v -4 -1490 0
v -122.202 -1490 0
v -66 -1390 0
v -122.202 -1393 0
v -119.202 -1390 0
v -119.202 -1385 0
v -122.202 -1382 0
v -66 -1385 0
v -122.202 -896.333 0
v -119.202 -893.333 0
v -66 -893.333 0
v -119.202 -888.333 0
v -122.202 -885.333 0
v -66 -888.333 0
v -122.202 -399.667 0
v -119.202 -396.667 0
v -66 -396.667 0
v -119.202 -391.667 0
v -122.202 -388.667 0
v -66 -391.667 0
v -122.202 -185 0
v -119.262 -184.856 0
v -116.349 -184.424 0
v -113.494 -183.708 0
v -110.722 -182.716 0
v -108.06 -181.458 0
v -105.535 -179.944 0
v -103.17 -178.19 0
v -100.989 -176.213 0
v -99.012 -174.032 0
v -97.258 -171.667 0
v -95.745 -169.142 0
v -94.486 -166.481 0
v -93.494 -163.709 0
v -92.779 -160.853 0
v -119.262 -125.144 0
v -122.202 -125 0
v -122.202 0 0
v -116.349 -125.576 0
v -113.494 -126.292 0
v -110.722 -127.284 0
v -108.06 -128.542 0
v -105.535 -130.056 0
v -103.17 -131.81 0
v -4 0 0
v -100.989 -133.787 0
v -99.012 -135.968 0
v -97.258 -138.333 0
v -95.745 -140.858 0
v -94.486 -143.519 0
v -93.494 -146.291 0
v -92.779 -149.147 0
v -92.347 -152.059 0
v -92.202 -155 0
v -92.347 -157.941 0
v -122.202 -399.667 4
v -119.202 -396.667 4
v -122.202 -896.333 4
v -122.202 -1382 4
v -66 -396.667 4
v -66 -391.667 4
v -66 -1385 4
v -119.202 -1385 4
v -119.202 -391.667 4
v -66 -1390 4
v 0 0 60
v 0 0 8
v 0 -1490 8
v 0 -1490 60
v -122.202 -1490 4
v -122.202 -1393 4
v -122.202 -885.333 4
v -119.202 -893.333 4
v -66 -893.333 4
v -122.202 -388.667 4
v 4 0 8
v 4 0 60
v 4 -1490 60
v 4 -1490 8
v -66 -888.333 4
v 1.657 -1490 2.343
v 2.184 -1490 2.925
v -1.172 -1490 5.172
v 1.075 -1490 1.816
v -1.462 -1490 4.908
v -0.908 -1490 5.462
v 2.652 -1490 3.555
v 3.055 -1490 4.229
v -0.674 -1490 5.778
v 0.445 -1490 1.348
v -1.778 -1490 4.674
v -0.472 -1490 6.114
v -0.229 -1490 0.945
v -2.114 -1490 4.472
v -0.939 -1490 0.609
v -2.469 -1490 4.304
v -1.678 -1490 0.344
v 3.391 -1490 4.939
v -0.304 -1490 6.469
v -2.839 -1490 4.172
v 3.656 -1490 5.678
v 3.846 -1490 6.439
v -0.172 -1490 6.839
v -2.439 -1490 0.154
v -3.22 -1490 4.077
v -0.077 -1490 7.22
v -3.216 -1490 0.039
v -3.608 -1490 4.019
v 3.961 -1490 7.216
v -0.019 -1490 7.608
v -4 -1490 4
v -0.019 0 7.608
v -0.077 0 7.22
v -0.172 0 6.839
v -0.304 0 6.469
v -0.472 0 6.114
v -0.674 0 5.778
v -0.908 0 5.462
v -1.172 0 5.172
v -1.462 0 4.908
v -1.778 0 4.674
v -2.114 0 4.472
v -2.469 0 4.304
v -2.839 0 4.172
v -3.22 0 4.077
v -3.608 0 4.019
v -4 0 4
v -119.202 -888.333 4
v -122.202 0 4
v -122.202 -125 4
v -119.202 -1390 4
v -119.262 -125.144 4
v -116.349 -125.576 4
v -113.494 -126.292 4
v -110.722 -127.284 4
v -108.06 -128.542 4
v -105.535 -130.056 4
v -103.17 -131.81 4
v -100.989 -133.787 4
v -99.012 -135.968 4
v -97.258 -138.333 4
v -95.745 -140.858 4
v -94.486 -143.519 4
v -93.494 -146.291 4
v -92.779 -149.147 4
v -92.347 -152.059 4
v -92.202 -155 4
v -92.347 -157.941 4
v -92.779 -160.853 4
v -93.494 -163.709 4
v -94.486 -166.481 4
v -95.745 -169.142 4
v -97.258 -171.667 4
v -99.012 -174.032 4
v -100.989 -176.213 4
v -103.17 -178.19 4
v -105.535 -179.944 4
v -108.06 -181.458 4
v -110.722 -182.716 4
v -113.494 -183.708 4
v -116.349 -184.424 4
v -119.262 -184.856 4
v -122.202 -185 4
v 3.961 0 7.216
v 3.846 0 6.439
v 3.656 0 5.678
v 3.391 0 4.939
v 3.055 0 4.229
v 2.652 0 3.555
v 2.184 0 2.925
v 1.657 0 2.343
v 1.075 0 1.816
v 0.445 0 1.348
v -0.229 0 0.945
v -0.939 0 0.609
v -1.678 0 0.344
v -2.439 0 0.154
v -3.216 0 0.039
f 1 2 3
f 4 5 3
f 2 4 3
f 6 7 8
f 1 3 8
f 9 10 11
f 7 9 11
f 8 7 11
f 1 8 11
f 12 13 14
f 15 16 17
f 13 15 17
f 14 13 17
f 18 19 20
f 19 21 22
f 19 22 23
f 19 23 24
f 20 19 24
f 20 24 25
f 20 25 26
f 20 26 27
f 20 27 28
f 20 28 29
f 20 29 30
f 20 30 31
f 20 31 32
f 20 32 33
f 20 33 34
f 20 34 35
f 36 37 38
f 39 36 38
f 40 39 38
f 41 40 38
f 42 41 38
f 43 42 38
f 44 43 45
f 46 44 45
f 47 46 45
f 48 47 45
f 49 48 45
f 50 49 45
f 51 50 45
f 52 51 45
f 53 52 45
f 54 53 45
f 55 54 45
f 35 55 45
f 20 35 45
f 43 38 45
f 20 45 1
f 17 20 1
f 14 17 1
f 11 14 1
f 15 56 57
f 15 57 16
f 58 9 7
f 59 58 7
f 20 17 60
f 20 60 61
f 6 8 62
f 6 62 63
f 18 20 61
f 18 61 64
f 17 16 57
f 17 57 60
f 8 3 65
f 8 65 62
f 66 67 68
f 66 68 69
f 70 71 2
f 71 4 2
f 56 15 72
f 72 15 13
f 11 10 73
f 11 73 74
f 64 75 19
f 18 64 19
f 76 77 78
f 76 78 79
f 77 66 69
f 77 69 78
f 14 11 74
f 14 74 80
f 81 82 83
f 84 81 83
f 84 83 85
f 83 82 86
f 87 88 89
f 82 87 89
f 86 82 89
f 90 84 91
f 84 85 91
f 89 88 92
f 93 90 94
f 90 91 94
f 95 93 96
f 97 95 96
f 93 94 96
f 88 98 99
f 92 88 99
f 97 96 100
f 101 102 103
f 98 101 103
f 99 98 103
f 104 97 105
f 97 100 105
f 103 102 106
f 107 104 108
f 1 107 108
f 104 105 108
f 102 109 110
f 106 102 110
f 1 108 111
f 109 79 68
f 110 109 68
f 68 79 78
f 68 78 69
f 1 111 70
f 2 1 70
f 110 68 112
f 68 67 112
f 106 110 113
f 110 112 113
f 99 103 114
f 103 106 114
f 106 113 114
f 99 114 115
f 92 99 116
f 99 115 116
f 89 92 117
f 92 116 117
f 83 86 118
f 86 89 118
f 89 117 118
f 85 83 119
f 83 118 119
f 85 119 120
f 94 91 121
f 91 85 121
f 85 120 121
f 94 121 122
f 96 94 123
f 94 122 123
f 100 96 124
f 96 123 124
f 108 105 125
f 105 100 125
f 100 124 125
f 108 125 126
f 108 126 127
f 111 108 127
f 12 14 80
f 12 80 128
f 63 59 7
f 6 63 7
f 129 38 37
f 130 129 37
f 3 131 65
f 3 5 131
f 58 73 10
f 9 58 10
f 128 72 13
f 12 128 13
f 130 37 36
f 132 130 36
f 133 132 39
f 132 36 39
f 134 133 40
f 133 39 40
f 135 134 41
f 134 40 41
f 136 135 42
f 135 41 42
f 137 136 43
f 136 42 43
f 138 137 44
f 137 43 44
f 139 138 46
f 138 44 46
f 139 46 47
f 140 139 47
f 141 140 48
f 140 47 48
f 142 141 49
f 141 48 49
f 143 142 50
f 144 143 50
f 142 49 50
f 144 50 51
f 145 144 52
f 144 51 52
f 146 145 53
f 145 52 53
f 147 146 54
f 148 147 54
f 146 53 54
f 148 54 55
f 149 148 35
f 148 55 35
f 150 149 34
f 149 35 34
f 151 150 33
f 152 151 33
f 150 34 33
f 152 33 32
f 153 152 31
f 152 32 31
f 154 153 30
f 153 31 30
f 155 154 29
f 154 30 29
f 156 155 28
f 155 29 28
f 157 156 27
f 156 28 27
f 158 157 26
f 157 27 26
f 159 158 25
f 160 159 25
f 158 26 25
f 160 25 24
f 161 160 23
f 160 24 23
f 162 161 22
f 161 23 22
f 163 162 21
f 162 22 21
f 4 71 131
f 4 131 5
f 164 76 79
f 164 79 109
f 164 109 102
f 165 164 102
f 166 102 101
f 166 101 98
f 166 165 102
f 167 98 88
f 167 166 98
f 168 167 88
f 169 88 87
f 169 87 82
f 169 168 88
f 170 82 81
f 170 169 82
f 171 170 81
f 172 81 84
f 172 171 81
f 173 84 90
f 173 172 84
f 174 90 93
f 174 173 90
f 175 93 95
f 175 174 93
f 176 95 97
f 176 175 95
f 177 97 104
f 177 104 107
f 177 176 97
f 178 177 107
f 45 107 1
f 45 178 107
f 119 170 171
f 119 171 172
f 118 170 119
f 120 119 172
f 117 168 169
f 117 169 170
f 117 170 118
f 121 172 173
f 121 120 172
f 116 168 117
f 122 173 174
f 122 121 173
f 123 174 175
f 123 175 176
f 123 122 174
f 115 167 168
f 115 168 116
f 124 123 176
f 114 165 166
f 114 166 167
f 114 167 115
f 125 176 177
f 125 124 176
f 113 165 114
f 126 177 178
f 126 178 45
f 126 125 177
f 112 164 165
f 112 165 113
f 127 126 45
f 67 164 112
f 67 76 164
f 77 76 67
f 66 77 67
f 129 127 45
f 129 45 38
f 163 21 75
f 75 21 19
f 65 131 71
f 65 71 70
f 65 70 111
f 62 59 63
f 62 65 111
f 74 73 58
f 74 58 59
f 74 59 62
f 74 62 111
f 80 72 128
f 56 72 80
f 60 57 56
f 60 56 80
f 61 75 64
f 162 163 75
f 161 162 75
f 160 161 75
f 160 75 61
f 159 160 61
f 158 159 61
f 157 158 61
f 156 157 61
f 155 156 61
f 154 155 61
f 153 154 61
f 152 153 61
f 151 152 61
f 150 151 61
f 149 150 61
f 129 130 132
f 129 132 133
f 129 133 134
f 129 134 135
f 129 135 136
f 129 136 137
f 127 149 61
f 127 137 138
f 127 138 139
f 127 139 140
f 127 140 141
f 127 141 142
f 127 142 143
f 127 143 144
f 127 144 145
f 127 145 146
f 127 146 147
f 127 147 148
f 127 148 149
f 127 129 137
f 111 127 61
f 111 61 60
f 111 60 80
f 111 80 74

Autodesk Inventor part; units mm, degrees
ref_plane "YZ Plane" through (0, 0, 0) normal (1, 0, 0) x (0, 1, 0)
ref_plane "XZ Plane" through (0, 0, 0) normal (0, 1, 0) x (-1, 0, 0)
ref_plane "XY Plane" through (0, 0, 0) normal (0, 0, 1) x (1, 0, 0)
sketch "Sketch1" plane through (0, 0, 0) normal (0, 0, 1) x (1, 0, 0)
  line L0 (0, 0) -> (-122.2022, 0)
  line L1 (-122.2022, 0) -> (-122.2022, -1490)
  line L2 (-122.2022, -1490) -> (0, -1490)
  line L3 (0, -1490) -> (0, 0)
  line L4 (-122.2022, -1390) -> (-66, -1390)
  line L5 (-66, -1390) -> (-66, -1385)
  line L6 (-66, -1385) -> (-122.2022, -1385)
  line L7 (-122.2022, -1385) -> (-122.2022, -1390)
  line L8 (-122.2022, -893.3333) -> (-66, -893.3333)
  line L9 (-66, -893.3333) -> (-66, -888.3333)
  line L10 (-66, -888.3333) -> (-122.2022, -888.3333)
  line L11 (-122.2022, -888.3333) -> (-122.2022, -893.3333)
  line L12 (-122.2022, -396.6667) -> (-66, -396.6667)
  line L13 (-66, -396.6667) -> (-66, -391.6667)
  line L14 (-66, -391.6667) -> (-122.2022, -391.6667)
  line L15 (-122.2022, -391.6667) -> (-122.2022, -396.6667)
  circle A0 centre (-122.2022, -155) radius 30
  point P0 (-122.2022, -1385)
  point P1 (-122.2022, -125)
  point P2 (-122.2022, -185)
  dimension "d0" = 1490
  dimension "d1" = 122.2022
  dimension "d2" = 5
  dimension "d4" = 100
  dimension "d7" = 496.6667
  dimension "d23" = 66
  dimension "d28" = 60
  dimension "d29" = 1335
extrude "Plate1" add sketch "Sketch1" along normal blind 4 contours L3 L2 L1 L4 L5 L6 L8 L9 L10 L12 L13 L14 A0 L0
sketch "Sketch2" plane through (4, 0, 0) normal (-1, 0, 0) x (0, -1, 0)
  line L0 (1490, 0) -> (0, 0)
  line L1 (0, 0) -> (0, 60)
  line L2 (0, 60) -> (1490, 60)
  line L3 (1490, 60) -> (1490, 0)
edge flange "Flange1" height 60 angle 90 thickness 4 bend radius 4 thickness toward (-1, 0, 0) relief tear relief width 4 relief depth 2 edges at (0, -745, 4) wall of the first edge with corners at (4, -1490, 0) (4, 0, 0) (4, 0, 60) (4, -1490, 60)
bend "Bend1"
corner "Corner1"
chamfer "Corner Chamfer1" distance 3 angle 45 6 edges at (-122.2022, -1390, 2) (-122.2022, -1385, 2) (-122.2022, -893.3333, 2) (-122.2022, -888.3333, 2) (-122.2022, -391.6667, 2) (-122.2022, -396.6667, 2)
equation "\"d0\" = Стрингер_длина"
equation "\"d1\" = стрингер_глубина_7"
equation "\"d2\" = паз_под_стрингер_толщина"
equation "\"d7\" = 0.333333 * Стрингер_длина"
equation "\"d23\" = паз_под_стрингер_глубина - Thickness"
equation "\"d28\" = 2 * радиус_выреза_под_сварку"
equation "\"d12\" = Thickness"
equation "\"d13\" = BendReliefWidth"
equation "\"d14\" = BendReliefDepth"
equation "\"d15\" = MinimumRemnant"
equation "\"d16\" = TransitionRadius"
equation "\"d17\" = ребро_усилителей"
equation "\"d19\" = BendRadius"
equation "\"d20\" = CornerReliefSize"
equation "\"d21\" = GapSize"
equation "\"d22\" = JacobiRadiusSize"
equation "\"BendRadius\" = Thickness"
equation "\"BendReliefWidth\" = Thickness"
equation "\"BendReliefDepth\" = 0.5 * Thickness"
equation "\"CornerReliefSize\" = 4 * Thickness"
equation "\"MinimumRemnant\" = 2 * Thickness"
equation "\"TransitionRadius\" = BendRadius"
equation "\"JacobiRadiusSize\" = BendRadius"
equation "\"GapSize\" = Thickness"
equation "\"Стрингер_длина\" = 1490"
equation "\"стрингер_глубина_7\" = 122.202218"
equation "\"паз_под_стрингер_толщина\" = 5"
equation "\"паз_под_стрингер_глубина\" = 70"
equation "\"Thickness\" = 4"
equation "\"радиус_выреза_под_сварку\" = 30"
equation "\"ребро_усилителей\" = 60"
properties part number "0381 GBK stringer 7" material "Steel"
